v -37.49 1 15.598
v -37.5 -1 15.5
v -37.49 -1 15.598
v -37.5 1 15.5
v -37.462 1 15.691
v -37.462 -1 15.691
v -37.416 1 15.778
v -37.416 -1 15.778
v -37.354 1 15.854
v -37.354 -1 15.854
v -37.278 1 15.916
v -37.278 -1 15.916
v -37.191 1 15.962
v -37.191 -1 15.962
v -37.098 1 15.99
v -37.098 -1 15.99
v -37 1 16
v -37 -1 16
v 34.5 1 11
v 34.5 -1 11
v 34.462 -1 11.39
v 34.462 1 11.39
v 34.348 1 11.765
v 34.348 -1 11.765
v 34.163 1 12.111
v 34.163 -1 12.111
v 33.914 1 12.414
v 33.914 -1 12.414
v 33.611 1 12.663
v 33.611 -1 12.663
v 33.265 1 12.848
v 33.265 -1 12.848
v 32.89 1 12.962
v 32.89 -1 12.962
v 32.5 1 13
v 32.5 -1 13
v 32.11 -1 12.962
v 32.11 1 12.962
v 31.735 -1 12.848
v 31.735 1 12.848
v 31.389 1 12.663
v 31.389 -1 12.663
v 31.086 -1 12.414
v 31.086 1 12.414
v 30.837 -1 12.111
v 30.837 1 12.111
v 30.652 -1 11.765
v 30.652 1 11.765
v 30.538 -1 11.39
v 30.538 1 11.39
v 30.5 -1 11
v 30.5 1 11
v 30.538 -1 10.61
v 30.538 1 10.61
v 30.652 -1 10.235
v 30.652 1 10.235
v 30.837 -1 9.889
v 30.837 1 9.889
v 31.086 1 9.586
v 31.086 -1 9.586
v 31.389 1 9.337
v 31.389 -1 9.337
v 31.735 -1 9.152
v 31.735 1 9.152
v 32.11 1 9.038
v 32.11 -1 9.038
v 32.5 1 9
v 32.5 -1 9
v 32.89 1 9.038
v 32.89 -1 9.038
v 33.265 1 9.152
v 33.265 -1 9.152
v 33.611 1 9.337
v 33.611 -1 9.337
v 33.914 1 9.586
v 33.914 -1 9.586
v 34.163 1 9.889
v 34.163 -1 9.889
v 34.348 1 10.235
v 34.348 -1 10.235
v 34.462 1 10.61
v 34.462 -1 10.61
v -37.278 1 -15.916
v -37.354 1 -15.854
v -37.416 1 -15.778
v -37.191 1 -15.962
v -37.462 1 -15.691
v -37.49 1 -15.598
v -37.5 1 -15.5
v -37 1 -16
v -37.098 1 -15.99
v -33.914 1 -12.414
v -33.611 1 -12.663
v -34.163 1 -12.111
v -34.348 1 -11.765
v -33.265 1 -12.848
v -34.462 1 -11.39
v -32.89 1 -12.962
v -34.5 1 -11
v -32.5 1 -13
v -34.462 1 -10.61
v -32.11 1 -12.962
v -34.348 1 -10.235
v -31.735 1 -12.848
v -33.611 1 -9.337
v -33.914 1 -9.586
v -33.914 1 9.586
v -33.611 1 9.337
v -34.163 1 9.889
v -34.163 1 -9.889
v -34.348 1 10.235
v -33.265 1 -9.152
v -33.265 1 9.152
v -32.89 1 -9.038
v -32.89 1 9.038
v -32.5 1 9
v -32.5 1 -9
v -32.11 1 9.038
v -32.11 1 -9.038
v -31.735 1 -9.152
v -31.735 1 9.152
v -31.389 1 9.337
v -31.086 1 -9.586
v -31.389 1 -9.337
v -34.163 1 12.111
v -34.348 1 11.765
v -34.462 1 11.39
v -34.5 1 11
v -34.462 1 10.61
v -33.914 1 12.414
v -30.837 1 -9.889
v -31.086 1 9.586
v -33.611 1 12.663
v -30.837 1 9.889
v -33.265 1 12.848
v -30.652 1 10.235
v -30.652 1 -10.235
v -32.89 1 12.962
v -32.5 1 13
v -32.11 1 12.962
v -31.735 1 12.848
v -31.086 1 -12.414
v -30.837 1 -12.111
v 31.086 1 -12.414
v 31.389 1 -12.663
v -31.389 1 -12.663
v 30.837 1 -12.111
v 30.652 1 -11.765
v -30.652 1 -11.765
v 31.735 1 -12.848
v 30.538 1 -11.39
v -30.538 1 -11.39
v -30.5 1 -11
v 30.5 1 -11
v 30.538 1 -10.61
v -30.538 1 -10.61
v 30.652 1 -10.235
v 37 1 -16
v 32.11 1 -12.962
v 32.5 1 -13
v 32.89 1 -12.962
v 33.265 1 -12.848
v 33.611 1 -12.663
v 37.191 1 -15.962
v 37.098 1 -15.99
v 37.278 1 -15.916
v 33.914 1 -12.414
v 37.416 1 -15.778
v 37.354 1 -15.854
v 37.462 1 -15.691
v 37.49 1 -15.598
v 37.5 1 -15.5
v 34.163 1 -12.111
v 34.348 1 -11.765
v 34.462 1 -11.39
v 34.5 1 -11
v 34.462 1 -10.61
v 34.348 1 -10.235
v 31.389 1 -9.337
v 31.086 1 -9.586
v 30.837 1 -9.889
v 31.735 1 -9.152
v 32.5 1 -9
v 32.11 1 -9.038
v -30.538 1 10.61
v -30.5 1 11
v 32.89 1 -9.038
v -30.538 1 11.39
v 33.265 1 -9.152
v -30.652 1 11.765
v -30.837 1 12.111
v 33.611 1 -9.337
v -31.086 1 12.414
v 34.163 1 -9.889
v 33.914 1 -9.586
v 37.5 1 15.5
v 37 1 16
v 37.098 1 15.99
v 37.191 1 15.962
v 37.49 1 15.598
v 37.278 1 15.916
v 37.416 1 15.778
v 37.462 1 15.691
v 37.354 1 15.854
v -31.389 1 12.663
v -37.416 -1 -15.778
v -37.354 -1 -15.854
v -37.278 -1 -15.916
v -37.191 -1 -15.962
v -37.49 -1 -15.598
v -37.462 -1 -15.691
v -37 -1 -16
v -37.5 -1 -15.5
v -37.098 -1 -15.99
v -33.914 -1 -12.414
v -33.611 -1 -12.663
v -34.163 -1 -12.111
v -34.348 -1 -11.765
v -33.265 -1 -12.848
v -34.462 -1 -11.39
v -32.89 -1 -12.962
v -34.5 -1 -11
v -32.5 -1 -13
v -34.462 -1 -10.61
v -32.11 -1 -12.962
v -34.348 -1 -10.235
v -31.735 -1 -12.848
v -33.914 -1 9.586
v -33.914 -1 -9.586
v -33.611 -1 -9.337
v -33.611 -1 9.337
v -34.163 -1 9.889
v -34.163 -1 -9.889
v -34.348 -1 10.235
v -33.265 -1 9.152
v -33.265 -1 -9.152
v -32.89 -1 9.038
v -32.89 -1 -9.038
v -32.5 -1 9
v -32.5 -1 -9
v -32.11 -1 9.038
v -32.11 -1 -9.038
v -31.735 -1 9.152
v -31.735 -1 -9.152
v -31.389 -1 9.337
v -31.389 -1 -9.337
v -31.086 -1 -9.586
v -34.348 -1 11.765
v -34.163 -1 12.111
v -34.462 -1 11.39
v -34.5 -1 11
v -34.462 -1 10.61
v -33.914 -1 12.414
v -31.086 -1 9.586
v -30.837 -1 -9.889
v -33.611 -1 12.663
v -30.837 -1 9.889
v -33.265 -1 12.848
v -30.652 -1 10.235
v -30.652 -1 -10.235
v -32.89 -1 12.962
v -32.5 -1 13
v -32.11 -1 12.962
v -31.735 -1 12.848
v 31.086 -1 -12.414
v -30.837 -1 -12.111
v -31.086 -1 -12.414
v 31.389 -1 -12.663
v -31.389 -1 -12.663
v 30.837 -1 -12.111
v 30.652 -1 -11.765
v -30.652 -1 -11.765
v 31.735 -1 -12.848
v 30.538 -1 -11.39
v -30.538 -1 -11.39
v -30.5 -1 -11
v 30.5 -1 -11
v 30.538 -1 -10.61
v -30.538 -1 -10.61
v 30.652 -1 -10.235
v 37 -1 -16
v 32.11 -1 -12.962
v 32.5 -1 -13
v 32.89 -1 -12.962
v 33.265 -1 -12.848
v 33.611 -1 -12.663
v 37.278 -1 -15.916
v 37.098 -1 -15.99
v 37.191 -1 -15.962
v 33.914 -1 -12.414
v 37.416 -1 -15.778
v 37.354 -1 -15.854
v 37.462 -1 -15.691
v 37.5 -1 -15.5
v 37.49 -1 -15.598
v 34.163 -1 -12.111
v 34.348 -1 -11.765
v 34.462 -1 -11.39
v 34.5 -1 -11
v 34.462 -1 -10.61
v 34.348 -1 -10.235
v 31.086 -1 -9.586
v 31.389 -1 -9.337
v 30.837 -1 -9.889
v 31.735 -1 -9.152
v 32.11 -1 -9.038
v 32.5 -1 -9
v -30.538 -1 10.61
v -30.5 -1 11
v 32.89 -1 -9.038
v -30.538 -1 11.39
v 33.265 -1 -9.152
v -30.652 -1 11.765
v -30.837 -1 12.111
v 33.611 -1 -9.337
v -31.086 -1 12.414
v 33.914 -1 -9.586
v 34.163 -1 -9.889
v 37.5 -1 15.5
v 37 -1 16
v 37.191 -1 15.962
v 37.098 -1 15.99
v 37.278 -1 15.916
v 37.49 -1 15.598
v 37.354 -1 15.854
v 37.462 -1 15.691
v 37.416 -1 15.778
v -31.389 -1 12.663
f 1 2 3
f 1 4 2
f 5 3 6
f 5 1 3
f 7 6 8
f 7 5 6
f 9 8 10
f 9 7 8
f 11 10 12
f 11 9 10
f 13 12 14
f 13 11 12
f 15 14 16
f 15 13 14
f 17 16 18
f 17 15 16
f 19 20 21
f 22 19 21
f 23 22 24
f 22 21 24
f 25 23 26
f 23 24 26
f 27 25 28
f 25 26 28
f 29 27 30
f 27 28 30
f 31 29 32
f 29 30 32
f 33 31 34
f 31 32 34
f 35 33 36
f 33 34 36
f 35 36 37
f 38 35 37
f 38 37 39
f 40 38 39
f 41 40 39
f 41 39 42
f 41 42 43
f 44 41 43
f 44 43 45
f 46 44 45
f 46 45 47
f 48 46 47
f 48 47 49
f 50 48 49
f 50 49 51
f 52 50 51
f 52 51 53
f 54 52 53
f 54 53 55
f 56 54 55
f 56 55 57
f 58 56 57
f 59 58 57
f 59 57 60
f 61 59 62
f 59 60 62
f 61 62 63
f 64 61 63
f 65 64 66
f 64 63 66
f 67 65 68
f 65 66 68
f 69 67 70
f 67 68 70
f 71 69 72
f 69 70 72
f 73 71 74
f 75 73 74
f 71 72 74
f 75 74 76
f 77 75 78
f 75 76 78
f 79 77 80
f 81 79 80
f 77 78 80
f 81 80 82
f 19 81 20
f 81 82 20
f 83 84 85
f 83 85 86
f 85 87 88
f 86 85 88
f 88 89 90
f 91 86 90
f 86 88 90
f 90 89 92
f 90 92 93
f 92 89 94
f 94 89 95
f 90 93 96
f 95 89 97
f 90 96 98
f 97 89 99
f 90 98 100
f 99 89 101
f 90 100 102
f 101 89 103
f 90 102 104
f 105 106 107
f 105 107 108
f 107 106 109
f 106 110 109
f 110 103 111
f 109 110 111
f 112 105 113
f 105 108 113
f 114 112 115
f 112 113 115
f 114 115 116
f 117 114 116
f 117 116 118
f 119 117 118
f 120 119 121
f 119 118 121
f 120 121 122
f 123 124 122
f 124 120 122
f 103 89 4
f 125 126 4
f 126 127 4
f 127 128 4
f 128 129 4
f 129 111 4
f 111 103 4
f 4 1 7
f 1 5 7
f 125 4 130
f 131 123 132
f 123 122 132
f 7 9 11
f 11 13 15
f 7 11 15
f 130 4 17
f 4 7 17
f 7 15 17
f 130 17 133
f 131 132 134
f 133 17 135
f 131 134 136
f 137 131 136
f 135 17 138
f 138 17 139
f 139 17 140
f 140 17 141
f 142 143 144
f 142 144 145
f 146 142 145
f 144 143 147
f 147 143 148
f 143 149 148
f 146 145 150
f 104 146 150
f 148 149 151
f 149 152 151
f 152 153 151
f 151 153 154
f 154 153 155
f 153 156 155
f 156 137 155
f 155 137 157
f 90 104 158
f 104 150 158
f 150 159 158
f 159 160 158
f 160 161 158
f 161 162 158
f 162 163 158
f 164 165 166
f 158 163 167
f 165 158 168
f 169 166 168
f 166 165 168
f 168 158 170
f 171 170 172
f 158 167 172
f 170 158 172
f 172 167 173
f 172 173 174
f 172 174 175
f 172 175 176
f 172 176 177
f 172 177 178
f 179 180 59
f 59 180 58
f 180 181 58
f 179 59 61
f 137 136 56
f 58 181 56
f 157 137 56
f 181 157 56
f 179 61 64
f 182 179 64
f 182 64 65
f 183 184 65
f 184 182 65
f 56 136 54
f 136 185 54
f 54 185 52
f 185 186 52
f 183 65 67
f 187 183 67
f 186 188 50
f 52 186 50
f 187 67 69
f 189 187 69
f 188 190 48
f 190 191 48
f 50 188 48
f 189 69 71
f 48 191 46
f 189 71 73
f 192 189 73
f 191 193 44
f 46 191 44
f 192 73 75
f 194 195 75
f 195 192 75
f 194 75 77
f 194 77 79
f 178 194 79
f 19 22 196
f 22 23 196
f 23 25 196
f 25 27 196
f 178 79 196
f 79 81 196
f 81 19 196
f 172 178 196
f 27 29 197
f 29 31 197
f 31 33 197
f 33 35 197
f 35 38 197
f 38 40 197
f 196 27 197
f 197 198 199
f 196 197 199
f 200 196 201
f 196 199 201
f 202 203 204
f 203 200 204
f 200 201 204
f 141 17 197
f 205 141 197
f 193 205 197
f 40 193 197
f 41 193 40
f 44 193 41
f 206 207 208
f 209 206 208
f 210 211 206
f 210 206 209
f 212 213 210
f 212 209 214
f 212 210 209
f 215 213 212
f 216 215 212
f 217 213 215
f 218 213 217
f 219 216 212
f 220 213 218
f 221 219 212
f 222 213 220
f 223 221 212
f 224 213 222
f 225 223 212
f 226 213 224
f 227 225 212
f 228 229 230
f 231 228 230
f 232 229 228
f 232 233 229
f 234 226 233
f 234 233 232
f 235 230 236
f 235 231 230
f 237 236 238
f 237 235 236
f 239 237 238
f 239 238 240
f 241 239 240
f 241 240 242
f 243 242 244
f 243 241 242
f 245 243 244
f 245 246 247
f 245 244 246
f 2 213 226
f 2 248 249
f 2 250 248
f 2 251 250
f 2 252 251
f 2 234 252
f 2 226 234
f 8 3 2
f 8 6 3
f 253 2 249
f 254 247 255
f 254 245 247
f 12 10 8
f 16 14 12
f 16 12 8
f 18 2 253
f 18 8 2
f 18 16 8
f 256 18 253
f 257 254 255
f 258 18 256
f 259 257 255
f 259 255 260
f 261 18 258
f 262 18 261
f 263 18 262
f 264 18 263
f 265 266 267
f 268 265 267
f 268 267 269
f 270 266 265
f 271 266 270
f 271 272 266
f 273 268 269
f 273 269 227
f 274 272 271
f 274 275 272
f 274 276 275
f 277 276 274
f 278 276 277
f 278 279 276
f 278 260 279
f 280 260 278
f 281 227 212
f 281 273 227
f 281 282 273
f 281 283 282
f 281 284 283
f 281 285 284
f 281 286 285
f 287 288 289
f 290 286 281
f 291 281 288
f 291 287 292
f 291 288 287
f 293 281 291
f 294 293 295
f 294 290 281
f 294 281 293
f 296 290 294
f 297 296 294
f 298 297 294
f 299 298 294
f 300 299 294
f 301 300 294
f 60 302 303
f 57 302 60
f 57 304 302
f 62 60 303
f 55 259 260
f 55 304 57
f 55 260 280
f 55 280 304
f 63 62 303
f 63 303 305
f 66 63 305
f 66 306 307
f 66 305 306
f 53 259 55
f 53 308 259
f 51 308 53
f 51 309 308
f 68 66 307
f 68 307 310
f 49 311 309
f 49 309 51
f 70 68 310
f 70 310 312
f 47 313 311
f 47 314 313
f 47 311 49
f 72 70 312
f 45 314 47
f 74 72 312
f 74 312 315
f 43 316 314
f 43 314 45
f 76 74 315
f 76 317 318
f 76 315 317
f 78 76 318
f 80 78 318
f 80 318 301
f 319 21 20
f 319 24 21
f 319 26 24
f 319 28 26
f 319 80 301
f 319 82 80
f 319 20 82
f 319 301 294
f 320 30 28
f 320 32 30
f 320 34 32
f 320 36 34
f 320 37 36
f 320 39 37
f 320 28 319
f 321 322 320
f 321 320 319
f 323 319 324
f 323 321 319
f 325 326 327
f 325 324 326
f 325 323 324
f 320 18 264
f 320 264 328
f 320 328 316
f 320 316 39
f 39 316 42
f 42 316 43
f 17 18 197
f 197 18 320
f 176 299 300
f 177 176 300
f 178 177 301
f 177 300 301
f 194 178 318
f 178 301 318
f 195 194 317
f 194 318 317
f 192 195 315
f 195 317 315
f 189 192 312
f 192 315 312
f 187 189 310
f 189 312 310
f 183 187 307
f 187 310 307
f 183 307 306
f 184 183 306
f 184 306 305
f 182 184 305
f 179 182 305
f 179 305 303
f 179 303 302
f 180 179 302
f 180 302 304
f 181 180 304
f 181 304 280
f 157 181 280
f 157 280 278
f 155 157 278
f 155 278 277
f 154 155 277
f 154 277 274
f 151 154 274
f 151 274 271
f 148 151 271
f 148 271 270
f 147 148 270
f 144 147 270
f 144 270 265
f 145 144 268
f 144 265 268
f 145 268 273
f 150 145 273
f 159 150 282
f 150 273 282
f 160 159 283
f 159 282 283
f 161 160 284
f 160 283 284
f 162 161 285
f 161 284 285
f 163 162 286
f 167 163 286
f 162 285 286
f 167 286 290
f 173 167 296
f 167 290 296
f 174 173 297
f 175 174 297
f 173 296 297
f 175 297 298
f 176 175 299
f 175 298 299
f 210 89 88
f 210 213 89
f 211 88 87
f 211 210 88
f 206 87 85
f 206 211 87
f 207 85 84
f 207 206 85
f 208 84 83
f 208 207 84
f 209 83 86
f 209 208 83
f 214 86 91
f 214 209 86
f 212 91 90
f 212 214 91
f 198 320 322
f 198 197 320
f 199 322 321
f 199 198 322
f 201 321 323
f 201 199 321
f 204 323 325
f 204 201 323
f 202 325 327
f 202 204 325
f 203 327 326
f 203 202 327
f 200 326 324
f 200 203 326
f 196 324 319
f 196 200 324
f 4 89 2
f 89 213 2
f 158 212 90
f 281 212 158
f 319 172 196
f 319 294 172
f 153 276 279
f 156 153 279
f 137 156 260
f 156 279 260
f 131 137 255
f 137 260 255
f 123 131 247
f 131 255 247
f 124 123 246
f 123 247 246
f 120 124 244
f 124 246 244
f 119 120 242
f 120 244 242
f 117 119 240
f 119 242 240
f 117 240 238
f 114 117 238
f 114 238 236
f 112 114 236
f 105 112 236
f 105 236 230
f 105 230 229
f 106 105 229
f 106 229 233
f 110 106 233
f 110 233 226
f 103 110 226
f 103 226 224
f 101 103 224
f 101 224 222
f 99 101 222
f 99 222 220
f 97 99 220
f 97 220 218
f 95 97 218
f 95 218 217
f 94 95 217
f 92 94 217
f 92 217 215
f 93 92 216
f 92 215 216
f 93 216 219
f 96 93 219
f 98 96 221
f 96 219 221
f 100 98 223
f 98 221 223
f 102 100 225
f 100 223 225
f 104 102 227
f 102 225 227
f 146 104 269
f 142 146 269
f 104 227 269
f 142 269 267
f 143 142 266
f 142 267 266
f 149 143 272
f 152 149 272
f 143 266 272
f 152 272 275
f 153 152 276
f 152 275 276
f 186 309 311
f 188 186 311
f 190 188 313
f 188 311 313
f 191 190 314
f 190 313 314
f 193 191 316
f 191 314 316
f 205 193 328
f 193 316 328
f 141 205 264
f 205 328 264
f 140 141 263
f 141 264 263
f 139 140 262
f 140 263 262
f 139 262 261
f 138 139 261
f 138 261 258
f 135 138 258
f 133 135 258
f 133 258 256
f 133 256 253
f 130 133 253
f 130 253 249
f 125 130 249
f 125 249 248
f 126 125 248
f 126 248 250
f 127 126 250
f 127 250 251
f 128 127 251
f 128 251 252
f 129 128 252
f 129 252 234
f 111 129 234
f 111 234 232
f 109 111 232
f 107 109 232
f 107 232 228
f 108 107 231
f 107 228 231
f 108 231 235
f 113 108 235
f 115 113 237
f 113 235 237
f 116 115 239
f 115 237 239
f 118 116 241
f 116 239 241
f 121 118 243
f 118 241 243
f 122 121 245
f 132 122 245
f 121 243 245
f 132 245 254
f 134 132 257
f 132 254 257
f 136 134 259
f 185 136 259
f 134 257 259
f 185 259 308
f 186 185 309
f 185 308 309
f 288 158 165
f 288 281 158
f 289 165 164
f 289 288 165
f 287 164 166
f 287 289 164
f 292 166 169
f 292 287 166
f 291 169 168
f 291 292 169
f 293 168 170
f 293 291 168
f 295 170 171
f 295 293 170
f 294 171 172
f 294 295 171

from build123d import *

# Parameters (mm, degrees)
F0_W     = 75
F0_H     = 32
F1_DEPTH = 1
F2_R     = 2
F3_DEPTH = 25.4
F4_R     = 0.5


with BuildPart() as f1:
    # F0 (on Front) → F1 (new body, symmetric)
    with BuildSketch(Plane.XZ):
        Rectangle(F0_W, F0_H)
    extrude(amount=F1_DEPTH, both=True)

    # F2 (on face) → F3 (cut)
    with BuildSketch(Plane.XZ.offset(1)):
        with Locations((-32.5, 11)):
            Circle(F2_R)
        with Locations((-32.5, -11)):
            Circle(F2_R)
        with Locations((32.5, -11)):
            Circle(F2_R)
        with Locations((32.5, 11)):
            Circle(F2_R)
    extrude(amount=-F3_DEPTH, mode=Mode.SUBTRACT)

    # F4
    f4_edges = [f1.edges().sort_by_distance(p)[0] for p in [
        (37.5, 0, 16),
        (37.5, 0, -16),
        (-37.5, 0, 16),
        (-37.5, 0, -16),
    ]]
    fillet(f4_edges, radius=F4_R)


solid = f1.part
